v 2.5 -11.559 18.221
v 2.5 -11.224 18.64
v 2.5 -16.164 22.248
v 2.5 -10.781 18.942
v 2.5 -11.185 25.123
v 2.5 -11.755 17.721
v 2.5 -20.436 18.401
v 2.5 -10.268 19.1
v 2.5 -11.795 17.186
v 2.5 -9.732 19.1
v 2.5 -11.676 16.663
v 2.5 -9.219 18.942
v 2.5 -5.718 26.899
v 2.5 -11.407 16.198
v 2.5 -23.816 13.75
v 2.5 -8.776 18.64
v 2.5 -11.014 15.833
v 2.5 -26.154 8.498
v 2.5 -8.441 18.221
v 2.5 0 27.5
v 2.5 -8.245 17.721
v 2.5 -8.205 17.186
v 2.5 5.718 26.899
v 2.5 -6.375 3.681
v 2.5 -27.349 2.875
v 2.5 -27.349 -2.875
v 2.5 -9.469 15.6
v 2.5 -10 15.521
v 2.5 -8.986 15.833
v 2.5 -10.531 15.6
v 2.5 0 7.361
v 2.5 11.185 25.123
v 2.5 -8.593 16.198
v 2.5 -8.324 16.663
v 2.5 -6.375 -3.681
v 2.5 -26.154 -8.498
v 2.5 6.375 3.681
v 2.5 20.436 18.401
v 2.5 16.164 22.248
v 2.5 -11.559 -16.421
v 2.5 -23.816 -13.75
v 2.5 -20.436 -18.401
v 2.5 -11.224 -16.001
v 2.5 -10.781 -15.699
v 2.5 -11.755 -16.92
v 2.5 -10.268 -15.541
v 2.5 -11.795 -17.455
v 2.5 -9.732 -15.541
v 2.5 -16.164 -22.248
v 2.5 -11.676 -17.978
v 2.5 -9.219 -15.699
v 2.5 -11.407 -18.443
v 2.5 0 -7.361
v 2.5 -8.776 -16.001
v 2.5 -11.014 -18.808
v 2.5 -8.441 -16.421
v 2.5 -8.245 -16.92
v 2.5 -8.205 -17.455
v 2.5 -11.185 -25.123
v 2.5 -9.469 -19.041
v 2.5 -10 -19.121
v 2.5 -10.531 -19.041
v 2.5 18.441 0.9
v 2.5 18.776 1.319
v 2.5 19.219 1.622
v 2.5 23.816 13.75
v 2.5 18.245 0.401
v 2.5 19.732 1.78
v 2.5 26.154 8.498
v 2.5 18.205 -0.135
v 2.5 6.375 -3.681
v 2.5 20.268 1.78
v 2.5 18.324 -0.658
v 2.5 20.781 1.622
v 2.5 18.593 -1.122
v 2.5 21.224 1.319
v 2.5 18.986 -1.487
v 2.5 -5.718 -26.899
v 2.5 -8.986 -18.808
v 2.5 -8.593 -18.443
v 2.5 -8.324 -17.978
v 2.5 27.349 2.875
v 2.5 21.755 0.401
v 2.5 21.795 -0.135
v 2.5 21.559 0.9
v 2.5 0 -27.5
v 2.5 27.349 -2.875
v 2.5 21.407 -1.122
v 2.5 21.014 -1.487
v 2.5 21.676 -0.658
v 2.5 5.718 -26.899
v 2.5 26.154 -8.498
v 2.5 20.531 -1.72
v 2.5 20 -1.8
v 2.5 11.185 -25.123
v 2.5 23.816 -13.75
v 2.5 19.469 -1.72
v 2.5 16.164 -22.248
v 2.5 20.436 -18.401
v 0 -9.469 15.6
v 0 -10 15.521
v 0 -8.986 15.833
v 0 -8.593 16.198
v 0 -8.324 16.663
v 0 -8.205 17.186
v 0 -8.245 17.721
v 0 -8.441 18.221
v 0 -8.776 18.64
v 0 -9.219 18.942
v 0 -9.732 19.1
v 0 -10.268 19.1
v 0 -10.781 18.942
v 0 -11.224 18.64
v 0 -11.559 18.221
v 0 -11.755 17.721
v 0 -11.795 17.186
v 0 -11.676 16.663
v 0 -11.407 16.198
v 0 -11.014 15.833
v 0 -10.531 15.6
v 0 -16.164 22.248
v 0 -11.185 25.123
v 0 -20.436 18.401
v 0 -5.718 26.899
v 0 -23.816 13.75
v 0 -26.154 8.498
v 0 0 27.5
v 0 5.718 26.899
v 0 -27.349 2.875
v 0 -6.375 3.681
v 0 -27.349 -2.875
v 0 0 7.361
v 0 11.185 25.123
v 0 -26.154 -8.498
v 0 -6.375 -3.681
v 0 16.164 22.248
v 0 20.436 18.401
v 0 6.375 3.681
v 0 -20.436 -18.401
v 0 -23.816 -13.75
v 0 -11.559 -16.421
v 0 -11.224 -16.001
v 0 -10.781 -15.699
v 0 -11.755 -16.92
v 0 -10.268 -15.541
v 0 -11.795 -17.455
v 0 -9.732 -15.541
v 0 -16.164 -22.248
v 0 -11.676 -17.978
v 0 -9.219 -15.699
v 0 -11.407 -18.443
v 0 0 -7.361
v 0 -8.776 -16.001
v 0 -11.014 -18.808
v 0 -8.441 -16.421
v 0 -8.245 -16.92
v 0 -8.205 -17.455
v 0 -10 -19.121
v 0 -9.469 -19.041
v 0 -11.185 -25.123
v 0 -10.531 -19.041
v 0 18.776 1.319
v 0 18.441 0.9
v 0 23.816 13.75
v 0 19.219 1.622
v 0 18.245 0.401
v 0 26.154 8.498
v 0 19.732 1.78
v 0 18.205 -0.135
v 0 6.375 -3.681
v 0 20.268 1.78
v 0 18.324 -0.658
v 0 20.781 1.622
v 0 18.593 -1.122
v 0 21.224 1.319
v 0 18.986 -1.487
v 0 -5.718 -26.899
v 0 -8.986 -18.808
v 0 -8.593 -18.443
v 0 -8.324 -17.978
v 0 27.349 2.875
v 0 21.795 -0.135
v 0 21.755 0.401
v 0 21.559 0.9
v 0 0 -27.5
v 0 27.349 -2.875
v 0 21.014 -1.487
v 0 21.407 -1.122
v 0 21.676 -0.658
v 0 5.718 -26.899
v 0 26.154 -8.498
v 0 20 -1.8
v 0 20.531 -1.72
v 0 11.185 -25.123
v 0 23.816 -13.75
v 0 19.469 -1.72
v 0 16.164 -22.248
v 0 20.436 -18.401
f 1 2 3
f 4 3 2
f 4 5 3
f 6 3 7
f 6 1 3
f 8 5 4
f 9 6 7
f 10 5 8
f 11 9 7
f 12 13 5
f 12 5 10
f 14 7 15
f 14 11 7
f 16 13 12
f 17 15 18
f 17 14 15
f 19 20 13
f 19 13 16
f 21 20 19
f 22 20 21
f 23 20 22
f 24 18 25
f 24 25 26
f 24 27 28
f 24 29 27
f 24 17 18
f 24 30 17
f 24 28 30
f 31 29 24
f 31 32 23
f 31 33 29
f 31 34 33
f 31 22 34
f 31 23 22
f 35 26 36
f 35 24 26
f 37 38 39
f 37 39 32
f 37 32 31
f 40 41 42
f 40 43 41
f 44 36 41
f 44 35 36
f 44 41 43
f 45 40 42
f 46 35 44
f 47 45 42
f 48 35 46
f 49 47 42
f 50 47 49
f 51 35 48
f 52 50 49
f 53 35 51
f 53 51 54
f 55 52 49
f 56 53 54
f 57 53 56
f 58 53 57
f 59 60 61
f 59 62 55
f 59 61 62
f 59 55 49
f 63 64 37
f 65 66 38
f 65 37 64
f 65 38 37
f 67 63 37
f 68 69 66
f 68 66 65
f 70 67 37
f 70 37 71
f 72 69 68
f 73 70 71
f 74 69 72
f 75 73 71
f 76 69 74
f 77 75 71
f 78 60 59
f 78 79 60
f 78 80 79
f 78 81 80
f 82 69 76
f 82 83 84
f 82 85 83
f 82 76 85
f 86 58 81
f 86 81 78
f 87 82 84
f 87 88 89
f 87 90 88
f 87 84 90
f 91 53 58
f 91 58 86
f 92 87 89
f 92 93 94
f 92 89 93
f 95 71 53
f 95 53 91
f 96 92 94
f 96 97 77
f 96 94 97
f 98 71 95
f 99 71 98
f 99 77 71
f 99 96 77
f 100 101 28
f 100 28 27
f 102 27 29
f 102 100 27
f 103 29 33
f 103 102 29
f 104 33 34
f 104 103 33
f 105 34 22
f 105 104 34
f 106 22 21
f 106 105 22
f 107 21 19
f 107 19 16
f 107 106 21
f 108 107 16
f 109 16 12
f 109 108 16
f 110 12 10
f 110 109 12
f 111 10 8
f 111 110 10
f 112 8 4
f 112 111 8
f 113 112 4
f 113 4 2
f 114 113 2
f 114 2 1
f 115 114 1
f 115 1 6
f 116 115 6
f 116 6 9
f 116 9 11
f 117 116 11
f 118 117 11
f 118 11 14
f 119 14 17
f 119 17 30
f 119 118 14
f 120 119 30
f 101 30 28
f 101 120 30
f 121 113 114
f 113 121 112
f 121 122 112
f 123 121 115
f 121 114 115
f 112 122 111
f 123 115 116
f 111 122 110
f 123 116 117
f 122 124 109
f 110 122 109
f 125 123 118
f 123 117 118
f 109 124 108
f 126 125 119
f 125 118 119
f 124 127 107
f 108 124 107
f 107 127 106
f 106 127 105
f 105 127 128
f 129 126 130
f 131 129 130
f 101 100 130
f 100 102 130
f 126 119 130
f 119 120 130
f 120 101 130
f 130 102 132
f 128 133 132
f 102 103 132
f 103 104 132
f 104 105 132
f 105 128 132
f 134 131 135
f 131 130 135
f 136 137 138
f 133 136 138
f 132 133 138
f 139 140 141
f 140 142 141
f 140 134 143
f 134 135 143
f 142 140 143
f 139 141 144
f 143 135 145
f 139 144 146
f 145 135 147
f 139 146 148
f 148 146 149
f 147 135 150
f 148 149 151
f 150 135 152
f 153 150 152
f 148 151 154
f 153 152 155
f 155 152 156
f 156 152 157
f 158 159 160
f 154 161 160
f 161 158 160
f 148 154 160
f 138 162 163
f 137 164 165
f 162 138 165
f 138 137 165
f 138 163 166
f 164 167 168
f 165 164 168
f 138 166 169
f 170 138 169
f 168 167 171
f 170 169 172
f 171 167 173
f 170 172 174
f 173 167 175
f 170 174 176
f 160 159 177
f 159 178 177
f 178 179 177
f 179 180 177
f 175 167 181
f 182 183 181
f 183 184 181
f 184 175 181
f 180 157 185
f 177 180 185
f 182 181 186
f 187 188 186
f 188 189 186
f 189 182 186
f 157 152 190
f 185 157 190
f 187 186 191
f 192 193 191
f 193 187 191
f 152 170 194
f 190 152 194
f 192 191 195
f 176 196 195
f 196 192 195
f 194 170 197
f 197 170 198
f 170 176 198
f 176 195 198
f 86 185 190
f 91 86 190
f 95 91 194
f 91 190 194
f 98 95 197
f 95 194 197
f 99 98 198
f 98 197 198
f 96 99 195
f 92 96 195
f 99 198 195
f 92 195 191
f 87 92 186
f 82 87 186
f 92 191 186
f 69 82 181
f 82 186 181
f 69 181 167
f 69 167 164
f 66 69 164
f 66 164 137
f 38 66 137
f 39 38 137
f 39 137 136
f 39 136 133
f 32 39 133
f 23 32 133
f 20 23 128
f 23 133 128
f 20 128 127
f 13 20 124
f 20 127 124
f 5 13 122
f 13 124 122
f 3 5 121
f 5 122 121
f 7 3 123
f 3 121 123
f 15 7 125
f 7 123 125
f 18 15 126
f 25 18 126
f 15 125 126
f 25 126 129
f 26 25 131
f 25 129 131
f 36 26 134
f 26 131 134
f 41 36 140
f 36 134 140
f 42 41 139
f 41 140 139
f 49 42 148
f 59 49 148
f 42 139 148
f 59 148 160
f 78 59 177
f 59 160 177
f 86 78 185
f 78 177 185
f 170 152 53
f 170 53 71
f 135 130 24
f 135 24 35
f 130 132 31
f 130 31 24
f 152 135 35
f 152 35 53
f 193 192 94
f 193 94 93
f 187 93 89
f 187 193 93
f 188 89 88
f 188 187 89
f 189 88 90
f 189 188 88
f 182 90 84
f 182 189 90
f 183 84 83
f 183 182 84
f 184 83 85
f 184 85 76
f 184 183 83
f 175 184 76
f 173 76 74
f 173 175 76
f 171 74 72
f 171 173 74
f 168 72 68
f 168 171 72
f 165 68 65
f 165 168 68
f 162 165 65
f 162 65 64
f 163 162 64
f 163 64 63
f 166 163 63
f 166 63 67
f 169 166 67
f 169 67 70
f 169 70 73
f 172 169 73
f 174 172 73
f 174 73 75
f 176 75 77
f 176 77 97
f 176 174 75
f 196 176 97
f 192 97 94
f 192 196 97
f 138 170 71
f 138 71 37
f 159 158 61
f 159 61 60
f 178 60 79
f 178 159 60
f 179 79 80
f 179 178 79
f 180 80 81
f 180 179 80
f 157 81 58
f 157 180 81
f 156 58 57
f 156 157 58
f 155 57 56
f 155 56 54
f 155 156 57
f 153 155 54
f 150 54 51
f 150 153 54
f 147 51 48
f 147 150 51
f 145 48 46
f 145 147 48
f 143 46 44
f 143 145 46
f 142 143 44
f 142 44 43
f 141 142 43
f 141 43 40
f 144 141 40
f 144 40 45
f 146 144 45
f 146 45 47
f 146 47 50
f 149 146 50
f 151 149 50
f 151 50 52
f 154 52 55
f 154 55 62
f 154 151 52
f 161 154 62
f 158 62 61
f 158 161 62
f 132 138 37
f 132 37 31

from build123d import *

# Parameters (mm, degrees)
SKETCH1_R           = 27.5
SKETCH1_R_2         = 1.8
BOSS_EXTRUDE1_DEPTH = 2.5


with BuildPart() as part:
    # Sketch1 → Boss-Extrude1 (new body)
    with BuildSketch(Plane(origin=(0, 0, 0), x_dir=(0, 0, -1), z_dir=(1, 0, 0))):
        Circle(SKETCH1_R)
        with Locations((0, 20)):
            Circle(SKETCH1_R_2, mode=Mode.SUBTRACT)
        with Locations((-17.320508076, -10)):
            Circle(SKETCH1_R_2, mode=Mode.SUBTRACT)
        with Locations((17.320508076, -10)):
            Circle(SKETCH1_R_2, mode=Mode.SUBTRACT)
        Polygon((3.680607966, 6.375), (-3.680607966, 6.375), (-7.361215932, 0), (-3.680607966, -6.375), (3.680607966, -6.375), (7.361215932, 0), align=None, mode=Mode.SUBTRACT)
    extrude(amount=BOSS_EXTRUDE1_DEPTH)


solid = part.part
